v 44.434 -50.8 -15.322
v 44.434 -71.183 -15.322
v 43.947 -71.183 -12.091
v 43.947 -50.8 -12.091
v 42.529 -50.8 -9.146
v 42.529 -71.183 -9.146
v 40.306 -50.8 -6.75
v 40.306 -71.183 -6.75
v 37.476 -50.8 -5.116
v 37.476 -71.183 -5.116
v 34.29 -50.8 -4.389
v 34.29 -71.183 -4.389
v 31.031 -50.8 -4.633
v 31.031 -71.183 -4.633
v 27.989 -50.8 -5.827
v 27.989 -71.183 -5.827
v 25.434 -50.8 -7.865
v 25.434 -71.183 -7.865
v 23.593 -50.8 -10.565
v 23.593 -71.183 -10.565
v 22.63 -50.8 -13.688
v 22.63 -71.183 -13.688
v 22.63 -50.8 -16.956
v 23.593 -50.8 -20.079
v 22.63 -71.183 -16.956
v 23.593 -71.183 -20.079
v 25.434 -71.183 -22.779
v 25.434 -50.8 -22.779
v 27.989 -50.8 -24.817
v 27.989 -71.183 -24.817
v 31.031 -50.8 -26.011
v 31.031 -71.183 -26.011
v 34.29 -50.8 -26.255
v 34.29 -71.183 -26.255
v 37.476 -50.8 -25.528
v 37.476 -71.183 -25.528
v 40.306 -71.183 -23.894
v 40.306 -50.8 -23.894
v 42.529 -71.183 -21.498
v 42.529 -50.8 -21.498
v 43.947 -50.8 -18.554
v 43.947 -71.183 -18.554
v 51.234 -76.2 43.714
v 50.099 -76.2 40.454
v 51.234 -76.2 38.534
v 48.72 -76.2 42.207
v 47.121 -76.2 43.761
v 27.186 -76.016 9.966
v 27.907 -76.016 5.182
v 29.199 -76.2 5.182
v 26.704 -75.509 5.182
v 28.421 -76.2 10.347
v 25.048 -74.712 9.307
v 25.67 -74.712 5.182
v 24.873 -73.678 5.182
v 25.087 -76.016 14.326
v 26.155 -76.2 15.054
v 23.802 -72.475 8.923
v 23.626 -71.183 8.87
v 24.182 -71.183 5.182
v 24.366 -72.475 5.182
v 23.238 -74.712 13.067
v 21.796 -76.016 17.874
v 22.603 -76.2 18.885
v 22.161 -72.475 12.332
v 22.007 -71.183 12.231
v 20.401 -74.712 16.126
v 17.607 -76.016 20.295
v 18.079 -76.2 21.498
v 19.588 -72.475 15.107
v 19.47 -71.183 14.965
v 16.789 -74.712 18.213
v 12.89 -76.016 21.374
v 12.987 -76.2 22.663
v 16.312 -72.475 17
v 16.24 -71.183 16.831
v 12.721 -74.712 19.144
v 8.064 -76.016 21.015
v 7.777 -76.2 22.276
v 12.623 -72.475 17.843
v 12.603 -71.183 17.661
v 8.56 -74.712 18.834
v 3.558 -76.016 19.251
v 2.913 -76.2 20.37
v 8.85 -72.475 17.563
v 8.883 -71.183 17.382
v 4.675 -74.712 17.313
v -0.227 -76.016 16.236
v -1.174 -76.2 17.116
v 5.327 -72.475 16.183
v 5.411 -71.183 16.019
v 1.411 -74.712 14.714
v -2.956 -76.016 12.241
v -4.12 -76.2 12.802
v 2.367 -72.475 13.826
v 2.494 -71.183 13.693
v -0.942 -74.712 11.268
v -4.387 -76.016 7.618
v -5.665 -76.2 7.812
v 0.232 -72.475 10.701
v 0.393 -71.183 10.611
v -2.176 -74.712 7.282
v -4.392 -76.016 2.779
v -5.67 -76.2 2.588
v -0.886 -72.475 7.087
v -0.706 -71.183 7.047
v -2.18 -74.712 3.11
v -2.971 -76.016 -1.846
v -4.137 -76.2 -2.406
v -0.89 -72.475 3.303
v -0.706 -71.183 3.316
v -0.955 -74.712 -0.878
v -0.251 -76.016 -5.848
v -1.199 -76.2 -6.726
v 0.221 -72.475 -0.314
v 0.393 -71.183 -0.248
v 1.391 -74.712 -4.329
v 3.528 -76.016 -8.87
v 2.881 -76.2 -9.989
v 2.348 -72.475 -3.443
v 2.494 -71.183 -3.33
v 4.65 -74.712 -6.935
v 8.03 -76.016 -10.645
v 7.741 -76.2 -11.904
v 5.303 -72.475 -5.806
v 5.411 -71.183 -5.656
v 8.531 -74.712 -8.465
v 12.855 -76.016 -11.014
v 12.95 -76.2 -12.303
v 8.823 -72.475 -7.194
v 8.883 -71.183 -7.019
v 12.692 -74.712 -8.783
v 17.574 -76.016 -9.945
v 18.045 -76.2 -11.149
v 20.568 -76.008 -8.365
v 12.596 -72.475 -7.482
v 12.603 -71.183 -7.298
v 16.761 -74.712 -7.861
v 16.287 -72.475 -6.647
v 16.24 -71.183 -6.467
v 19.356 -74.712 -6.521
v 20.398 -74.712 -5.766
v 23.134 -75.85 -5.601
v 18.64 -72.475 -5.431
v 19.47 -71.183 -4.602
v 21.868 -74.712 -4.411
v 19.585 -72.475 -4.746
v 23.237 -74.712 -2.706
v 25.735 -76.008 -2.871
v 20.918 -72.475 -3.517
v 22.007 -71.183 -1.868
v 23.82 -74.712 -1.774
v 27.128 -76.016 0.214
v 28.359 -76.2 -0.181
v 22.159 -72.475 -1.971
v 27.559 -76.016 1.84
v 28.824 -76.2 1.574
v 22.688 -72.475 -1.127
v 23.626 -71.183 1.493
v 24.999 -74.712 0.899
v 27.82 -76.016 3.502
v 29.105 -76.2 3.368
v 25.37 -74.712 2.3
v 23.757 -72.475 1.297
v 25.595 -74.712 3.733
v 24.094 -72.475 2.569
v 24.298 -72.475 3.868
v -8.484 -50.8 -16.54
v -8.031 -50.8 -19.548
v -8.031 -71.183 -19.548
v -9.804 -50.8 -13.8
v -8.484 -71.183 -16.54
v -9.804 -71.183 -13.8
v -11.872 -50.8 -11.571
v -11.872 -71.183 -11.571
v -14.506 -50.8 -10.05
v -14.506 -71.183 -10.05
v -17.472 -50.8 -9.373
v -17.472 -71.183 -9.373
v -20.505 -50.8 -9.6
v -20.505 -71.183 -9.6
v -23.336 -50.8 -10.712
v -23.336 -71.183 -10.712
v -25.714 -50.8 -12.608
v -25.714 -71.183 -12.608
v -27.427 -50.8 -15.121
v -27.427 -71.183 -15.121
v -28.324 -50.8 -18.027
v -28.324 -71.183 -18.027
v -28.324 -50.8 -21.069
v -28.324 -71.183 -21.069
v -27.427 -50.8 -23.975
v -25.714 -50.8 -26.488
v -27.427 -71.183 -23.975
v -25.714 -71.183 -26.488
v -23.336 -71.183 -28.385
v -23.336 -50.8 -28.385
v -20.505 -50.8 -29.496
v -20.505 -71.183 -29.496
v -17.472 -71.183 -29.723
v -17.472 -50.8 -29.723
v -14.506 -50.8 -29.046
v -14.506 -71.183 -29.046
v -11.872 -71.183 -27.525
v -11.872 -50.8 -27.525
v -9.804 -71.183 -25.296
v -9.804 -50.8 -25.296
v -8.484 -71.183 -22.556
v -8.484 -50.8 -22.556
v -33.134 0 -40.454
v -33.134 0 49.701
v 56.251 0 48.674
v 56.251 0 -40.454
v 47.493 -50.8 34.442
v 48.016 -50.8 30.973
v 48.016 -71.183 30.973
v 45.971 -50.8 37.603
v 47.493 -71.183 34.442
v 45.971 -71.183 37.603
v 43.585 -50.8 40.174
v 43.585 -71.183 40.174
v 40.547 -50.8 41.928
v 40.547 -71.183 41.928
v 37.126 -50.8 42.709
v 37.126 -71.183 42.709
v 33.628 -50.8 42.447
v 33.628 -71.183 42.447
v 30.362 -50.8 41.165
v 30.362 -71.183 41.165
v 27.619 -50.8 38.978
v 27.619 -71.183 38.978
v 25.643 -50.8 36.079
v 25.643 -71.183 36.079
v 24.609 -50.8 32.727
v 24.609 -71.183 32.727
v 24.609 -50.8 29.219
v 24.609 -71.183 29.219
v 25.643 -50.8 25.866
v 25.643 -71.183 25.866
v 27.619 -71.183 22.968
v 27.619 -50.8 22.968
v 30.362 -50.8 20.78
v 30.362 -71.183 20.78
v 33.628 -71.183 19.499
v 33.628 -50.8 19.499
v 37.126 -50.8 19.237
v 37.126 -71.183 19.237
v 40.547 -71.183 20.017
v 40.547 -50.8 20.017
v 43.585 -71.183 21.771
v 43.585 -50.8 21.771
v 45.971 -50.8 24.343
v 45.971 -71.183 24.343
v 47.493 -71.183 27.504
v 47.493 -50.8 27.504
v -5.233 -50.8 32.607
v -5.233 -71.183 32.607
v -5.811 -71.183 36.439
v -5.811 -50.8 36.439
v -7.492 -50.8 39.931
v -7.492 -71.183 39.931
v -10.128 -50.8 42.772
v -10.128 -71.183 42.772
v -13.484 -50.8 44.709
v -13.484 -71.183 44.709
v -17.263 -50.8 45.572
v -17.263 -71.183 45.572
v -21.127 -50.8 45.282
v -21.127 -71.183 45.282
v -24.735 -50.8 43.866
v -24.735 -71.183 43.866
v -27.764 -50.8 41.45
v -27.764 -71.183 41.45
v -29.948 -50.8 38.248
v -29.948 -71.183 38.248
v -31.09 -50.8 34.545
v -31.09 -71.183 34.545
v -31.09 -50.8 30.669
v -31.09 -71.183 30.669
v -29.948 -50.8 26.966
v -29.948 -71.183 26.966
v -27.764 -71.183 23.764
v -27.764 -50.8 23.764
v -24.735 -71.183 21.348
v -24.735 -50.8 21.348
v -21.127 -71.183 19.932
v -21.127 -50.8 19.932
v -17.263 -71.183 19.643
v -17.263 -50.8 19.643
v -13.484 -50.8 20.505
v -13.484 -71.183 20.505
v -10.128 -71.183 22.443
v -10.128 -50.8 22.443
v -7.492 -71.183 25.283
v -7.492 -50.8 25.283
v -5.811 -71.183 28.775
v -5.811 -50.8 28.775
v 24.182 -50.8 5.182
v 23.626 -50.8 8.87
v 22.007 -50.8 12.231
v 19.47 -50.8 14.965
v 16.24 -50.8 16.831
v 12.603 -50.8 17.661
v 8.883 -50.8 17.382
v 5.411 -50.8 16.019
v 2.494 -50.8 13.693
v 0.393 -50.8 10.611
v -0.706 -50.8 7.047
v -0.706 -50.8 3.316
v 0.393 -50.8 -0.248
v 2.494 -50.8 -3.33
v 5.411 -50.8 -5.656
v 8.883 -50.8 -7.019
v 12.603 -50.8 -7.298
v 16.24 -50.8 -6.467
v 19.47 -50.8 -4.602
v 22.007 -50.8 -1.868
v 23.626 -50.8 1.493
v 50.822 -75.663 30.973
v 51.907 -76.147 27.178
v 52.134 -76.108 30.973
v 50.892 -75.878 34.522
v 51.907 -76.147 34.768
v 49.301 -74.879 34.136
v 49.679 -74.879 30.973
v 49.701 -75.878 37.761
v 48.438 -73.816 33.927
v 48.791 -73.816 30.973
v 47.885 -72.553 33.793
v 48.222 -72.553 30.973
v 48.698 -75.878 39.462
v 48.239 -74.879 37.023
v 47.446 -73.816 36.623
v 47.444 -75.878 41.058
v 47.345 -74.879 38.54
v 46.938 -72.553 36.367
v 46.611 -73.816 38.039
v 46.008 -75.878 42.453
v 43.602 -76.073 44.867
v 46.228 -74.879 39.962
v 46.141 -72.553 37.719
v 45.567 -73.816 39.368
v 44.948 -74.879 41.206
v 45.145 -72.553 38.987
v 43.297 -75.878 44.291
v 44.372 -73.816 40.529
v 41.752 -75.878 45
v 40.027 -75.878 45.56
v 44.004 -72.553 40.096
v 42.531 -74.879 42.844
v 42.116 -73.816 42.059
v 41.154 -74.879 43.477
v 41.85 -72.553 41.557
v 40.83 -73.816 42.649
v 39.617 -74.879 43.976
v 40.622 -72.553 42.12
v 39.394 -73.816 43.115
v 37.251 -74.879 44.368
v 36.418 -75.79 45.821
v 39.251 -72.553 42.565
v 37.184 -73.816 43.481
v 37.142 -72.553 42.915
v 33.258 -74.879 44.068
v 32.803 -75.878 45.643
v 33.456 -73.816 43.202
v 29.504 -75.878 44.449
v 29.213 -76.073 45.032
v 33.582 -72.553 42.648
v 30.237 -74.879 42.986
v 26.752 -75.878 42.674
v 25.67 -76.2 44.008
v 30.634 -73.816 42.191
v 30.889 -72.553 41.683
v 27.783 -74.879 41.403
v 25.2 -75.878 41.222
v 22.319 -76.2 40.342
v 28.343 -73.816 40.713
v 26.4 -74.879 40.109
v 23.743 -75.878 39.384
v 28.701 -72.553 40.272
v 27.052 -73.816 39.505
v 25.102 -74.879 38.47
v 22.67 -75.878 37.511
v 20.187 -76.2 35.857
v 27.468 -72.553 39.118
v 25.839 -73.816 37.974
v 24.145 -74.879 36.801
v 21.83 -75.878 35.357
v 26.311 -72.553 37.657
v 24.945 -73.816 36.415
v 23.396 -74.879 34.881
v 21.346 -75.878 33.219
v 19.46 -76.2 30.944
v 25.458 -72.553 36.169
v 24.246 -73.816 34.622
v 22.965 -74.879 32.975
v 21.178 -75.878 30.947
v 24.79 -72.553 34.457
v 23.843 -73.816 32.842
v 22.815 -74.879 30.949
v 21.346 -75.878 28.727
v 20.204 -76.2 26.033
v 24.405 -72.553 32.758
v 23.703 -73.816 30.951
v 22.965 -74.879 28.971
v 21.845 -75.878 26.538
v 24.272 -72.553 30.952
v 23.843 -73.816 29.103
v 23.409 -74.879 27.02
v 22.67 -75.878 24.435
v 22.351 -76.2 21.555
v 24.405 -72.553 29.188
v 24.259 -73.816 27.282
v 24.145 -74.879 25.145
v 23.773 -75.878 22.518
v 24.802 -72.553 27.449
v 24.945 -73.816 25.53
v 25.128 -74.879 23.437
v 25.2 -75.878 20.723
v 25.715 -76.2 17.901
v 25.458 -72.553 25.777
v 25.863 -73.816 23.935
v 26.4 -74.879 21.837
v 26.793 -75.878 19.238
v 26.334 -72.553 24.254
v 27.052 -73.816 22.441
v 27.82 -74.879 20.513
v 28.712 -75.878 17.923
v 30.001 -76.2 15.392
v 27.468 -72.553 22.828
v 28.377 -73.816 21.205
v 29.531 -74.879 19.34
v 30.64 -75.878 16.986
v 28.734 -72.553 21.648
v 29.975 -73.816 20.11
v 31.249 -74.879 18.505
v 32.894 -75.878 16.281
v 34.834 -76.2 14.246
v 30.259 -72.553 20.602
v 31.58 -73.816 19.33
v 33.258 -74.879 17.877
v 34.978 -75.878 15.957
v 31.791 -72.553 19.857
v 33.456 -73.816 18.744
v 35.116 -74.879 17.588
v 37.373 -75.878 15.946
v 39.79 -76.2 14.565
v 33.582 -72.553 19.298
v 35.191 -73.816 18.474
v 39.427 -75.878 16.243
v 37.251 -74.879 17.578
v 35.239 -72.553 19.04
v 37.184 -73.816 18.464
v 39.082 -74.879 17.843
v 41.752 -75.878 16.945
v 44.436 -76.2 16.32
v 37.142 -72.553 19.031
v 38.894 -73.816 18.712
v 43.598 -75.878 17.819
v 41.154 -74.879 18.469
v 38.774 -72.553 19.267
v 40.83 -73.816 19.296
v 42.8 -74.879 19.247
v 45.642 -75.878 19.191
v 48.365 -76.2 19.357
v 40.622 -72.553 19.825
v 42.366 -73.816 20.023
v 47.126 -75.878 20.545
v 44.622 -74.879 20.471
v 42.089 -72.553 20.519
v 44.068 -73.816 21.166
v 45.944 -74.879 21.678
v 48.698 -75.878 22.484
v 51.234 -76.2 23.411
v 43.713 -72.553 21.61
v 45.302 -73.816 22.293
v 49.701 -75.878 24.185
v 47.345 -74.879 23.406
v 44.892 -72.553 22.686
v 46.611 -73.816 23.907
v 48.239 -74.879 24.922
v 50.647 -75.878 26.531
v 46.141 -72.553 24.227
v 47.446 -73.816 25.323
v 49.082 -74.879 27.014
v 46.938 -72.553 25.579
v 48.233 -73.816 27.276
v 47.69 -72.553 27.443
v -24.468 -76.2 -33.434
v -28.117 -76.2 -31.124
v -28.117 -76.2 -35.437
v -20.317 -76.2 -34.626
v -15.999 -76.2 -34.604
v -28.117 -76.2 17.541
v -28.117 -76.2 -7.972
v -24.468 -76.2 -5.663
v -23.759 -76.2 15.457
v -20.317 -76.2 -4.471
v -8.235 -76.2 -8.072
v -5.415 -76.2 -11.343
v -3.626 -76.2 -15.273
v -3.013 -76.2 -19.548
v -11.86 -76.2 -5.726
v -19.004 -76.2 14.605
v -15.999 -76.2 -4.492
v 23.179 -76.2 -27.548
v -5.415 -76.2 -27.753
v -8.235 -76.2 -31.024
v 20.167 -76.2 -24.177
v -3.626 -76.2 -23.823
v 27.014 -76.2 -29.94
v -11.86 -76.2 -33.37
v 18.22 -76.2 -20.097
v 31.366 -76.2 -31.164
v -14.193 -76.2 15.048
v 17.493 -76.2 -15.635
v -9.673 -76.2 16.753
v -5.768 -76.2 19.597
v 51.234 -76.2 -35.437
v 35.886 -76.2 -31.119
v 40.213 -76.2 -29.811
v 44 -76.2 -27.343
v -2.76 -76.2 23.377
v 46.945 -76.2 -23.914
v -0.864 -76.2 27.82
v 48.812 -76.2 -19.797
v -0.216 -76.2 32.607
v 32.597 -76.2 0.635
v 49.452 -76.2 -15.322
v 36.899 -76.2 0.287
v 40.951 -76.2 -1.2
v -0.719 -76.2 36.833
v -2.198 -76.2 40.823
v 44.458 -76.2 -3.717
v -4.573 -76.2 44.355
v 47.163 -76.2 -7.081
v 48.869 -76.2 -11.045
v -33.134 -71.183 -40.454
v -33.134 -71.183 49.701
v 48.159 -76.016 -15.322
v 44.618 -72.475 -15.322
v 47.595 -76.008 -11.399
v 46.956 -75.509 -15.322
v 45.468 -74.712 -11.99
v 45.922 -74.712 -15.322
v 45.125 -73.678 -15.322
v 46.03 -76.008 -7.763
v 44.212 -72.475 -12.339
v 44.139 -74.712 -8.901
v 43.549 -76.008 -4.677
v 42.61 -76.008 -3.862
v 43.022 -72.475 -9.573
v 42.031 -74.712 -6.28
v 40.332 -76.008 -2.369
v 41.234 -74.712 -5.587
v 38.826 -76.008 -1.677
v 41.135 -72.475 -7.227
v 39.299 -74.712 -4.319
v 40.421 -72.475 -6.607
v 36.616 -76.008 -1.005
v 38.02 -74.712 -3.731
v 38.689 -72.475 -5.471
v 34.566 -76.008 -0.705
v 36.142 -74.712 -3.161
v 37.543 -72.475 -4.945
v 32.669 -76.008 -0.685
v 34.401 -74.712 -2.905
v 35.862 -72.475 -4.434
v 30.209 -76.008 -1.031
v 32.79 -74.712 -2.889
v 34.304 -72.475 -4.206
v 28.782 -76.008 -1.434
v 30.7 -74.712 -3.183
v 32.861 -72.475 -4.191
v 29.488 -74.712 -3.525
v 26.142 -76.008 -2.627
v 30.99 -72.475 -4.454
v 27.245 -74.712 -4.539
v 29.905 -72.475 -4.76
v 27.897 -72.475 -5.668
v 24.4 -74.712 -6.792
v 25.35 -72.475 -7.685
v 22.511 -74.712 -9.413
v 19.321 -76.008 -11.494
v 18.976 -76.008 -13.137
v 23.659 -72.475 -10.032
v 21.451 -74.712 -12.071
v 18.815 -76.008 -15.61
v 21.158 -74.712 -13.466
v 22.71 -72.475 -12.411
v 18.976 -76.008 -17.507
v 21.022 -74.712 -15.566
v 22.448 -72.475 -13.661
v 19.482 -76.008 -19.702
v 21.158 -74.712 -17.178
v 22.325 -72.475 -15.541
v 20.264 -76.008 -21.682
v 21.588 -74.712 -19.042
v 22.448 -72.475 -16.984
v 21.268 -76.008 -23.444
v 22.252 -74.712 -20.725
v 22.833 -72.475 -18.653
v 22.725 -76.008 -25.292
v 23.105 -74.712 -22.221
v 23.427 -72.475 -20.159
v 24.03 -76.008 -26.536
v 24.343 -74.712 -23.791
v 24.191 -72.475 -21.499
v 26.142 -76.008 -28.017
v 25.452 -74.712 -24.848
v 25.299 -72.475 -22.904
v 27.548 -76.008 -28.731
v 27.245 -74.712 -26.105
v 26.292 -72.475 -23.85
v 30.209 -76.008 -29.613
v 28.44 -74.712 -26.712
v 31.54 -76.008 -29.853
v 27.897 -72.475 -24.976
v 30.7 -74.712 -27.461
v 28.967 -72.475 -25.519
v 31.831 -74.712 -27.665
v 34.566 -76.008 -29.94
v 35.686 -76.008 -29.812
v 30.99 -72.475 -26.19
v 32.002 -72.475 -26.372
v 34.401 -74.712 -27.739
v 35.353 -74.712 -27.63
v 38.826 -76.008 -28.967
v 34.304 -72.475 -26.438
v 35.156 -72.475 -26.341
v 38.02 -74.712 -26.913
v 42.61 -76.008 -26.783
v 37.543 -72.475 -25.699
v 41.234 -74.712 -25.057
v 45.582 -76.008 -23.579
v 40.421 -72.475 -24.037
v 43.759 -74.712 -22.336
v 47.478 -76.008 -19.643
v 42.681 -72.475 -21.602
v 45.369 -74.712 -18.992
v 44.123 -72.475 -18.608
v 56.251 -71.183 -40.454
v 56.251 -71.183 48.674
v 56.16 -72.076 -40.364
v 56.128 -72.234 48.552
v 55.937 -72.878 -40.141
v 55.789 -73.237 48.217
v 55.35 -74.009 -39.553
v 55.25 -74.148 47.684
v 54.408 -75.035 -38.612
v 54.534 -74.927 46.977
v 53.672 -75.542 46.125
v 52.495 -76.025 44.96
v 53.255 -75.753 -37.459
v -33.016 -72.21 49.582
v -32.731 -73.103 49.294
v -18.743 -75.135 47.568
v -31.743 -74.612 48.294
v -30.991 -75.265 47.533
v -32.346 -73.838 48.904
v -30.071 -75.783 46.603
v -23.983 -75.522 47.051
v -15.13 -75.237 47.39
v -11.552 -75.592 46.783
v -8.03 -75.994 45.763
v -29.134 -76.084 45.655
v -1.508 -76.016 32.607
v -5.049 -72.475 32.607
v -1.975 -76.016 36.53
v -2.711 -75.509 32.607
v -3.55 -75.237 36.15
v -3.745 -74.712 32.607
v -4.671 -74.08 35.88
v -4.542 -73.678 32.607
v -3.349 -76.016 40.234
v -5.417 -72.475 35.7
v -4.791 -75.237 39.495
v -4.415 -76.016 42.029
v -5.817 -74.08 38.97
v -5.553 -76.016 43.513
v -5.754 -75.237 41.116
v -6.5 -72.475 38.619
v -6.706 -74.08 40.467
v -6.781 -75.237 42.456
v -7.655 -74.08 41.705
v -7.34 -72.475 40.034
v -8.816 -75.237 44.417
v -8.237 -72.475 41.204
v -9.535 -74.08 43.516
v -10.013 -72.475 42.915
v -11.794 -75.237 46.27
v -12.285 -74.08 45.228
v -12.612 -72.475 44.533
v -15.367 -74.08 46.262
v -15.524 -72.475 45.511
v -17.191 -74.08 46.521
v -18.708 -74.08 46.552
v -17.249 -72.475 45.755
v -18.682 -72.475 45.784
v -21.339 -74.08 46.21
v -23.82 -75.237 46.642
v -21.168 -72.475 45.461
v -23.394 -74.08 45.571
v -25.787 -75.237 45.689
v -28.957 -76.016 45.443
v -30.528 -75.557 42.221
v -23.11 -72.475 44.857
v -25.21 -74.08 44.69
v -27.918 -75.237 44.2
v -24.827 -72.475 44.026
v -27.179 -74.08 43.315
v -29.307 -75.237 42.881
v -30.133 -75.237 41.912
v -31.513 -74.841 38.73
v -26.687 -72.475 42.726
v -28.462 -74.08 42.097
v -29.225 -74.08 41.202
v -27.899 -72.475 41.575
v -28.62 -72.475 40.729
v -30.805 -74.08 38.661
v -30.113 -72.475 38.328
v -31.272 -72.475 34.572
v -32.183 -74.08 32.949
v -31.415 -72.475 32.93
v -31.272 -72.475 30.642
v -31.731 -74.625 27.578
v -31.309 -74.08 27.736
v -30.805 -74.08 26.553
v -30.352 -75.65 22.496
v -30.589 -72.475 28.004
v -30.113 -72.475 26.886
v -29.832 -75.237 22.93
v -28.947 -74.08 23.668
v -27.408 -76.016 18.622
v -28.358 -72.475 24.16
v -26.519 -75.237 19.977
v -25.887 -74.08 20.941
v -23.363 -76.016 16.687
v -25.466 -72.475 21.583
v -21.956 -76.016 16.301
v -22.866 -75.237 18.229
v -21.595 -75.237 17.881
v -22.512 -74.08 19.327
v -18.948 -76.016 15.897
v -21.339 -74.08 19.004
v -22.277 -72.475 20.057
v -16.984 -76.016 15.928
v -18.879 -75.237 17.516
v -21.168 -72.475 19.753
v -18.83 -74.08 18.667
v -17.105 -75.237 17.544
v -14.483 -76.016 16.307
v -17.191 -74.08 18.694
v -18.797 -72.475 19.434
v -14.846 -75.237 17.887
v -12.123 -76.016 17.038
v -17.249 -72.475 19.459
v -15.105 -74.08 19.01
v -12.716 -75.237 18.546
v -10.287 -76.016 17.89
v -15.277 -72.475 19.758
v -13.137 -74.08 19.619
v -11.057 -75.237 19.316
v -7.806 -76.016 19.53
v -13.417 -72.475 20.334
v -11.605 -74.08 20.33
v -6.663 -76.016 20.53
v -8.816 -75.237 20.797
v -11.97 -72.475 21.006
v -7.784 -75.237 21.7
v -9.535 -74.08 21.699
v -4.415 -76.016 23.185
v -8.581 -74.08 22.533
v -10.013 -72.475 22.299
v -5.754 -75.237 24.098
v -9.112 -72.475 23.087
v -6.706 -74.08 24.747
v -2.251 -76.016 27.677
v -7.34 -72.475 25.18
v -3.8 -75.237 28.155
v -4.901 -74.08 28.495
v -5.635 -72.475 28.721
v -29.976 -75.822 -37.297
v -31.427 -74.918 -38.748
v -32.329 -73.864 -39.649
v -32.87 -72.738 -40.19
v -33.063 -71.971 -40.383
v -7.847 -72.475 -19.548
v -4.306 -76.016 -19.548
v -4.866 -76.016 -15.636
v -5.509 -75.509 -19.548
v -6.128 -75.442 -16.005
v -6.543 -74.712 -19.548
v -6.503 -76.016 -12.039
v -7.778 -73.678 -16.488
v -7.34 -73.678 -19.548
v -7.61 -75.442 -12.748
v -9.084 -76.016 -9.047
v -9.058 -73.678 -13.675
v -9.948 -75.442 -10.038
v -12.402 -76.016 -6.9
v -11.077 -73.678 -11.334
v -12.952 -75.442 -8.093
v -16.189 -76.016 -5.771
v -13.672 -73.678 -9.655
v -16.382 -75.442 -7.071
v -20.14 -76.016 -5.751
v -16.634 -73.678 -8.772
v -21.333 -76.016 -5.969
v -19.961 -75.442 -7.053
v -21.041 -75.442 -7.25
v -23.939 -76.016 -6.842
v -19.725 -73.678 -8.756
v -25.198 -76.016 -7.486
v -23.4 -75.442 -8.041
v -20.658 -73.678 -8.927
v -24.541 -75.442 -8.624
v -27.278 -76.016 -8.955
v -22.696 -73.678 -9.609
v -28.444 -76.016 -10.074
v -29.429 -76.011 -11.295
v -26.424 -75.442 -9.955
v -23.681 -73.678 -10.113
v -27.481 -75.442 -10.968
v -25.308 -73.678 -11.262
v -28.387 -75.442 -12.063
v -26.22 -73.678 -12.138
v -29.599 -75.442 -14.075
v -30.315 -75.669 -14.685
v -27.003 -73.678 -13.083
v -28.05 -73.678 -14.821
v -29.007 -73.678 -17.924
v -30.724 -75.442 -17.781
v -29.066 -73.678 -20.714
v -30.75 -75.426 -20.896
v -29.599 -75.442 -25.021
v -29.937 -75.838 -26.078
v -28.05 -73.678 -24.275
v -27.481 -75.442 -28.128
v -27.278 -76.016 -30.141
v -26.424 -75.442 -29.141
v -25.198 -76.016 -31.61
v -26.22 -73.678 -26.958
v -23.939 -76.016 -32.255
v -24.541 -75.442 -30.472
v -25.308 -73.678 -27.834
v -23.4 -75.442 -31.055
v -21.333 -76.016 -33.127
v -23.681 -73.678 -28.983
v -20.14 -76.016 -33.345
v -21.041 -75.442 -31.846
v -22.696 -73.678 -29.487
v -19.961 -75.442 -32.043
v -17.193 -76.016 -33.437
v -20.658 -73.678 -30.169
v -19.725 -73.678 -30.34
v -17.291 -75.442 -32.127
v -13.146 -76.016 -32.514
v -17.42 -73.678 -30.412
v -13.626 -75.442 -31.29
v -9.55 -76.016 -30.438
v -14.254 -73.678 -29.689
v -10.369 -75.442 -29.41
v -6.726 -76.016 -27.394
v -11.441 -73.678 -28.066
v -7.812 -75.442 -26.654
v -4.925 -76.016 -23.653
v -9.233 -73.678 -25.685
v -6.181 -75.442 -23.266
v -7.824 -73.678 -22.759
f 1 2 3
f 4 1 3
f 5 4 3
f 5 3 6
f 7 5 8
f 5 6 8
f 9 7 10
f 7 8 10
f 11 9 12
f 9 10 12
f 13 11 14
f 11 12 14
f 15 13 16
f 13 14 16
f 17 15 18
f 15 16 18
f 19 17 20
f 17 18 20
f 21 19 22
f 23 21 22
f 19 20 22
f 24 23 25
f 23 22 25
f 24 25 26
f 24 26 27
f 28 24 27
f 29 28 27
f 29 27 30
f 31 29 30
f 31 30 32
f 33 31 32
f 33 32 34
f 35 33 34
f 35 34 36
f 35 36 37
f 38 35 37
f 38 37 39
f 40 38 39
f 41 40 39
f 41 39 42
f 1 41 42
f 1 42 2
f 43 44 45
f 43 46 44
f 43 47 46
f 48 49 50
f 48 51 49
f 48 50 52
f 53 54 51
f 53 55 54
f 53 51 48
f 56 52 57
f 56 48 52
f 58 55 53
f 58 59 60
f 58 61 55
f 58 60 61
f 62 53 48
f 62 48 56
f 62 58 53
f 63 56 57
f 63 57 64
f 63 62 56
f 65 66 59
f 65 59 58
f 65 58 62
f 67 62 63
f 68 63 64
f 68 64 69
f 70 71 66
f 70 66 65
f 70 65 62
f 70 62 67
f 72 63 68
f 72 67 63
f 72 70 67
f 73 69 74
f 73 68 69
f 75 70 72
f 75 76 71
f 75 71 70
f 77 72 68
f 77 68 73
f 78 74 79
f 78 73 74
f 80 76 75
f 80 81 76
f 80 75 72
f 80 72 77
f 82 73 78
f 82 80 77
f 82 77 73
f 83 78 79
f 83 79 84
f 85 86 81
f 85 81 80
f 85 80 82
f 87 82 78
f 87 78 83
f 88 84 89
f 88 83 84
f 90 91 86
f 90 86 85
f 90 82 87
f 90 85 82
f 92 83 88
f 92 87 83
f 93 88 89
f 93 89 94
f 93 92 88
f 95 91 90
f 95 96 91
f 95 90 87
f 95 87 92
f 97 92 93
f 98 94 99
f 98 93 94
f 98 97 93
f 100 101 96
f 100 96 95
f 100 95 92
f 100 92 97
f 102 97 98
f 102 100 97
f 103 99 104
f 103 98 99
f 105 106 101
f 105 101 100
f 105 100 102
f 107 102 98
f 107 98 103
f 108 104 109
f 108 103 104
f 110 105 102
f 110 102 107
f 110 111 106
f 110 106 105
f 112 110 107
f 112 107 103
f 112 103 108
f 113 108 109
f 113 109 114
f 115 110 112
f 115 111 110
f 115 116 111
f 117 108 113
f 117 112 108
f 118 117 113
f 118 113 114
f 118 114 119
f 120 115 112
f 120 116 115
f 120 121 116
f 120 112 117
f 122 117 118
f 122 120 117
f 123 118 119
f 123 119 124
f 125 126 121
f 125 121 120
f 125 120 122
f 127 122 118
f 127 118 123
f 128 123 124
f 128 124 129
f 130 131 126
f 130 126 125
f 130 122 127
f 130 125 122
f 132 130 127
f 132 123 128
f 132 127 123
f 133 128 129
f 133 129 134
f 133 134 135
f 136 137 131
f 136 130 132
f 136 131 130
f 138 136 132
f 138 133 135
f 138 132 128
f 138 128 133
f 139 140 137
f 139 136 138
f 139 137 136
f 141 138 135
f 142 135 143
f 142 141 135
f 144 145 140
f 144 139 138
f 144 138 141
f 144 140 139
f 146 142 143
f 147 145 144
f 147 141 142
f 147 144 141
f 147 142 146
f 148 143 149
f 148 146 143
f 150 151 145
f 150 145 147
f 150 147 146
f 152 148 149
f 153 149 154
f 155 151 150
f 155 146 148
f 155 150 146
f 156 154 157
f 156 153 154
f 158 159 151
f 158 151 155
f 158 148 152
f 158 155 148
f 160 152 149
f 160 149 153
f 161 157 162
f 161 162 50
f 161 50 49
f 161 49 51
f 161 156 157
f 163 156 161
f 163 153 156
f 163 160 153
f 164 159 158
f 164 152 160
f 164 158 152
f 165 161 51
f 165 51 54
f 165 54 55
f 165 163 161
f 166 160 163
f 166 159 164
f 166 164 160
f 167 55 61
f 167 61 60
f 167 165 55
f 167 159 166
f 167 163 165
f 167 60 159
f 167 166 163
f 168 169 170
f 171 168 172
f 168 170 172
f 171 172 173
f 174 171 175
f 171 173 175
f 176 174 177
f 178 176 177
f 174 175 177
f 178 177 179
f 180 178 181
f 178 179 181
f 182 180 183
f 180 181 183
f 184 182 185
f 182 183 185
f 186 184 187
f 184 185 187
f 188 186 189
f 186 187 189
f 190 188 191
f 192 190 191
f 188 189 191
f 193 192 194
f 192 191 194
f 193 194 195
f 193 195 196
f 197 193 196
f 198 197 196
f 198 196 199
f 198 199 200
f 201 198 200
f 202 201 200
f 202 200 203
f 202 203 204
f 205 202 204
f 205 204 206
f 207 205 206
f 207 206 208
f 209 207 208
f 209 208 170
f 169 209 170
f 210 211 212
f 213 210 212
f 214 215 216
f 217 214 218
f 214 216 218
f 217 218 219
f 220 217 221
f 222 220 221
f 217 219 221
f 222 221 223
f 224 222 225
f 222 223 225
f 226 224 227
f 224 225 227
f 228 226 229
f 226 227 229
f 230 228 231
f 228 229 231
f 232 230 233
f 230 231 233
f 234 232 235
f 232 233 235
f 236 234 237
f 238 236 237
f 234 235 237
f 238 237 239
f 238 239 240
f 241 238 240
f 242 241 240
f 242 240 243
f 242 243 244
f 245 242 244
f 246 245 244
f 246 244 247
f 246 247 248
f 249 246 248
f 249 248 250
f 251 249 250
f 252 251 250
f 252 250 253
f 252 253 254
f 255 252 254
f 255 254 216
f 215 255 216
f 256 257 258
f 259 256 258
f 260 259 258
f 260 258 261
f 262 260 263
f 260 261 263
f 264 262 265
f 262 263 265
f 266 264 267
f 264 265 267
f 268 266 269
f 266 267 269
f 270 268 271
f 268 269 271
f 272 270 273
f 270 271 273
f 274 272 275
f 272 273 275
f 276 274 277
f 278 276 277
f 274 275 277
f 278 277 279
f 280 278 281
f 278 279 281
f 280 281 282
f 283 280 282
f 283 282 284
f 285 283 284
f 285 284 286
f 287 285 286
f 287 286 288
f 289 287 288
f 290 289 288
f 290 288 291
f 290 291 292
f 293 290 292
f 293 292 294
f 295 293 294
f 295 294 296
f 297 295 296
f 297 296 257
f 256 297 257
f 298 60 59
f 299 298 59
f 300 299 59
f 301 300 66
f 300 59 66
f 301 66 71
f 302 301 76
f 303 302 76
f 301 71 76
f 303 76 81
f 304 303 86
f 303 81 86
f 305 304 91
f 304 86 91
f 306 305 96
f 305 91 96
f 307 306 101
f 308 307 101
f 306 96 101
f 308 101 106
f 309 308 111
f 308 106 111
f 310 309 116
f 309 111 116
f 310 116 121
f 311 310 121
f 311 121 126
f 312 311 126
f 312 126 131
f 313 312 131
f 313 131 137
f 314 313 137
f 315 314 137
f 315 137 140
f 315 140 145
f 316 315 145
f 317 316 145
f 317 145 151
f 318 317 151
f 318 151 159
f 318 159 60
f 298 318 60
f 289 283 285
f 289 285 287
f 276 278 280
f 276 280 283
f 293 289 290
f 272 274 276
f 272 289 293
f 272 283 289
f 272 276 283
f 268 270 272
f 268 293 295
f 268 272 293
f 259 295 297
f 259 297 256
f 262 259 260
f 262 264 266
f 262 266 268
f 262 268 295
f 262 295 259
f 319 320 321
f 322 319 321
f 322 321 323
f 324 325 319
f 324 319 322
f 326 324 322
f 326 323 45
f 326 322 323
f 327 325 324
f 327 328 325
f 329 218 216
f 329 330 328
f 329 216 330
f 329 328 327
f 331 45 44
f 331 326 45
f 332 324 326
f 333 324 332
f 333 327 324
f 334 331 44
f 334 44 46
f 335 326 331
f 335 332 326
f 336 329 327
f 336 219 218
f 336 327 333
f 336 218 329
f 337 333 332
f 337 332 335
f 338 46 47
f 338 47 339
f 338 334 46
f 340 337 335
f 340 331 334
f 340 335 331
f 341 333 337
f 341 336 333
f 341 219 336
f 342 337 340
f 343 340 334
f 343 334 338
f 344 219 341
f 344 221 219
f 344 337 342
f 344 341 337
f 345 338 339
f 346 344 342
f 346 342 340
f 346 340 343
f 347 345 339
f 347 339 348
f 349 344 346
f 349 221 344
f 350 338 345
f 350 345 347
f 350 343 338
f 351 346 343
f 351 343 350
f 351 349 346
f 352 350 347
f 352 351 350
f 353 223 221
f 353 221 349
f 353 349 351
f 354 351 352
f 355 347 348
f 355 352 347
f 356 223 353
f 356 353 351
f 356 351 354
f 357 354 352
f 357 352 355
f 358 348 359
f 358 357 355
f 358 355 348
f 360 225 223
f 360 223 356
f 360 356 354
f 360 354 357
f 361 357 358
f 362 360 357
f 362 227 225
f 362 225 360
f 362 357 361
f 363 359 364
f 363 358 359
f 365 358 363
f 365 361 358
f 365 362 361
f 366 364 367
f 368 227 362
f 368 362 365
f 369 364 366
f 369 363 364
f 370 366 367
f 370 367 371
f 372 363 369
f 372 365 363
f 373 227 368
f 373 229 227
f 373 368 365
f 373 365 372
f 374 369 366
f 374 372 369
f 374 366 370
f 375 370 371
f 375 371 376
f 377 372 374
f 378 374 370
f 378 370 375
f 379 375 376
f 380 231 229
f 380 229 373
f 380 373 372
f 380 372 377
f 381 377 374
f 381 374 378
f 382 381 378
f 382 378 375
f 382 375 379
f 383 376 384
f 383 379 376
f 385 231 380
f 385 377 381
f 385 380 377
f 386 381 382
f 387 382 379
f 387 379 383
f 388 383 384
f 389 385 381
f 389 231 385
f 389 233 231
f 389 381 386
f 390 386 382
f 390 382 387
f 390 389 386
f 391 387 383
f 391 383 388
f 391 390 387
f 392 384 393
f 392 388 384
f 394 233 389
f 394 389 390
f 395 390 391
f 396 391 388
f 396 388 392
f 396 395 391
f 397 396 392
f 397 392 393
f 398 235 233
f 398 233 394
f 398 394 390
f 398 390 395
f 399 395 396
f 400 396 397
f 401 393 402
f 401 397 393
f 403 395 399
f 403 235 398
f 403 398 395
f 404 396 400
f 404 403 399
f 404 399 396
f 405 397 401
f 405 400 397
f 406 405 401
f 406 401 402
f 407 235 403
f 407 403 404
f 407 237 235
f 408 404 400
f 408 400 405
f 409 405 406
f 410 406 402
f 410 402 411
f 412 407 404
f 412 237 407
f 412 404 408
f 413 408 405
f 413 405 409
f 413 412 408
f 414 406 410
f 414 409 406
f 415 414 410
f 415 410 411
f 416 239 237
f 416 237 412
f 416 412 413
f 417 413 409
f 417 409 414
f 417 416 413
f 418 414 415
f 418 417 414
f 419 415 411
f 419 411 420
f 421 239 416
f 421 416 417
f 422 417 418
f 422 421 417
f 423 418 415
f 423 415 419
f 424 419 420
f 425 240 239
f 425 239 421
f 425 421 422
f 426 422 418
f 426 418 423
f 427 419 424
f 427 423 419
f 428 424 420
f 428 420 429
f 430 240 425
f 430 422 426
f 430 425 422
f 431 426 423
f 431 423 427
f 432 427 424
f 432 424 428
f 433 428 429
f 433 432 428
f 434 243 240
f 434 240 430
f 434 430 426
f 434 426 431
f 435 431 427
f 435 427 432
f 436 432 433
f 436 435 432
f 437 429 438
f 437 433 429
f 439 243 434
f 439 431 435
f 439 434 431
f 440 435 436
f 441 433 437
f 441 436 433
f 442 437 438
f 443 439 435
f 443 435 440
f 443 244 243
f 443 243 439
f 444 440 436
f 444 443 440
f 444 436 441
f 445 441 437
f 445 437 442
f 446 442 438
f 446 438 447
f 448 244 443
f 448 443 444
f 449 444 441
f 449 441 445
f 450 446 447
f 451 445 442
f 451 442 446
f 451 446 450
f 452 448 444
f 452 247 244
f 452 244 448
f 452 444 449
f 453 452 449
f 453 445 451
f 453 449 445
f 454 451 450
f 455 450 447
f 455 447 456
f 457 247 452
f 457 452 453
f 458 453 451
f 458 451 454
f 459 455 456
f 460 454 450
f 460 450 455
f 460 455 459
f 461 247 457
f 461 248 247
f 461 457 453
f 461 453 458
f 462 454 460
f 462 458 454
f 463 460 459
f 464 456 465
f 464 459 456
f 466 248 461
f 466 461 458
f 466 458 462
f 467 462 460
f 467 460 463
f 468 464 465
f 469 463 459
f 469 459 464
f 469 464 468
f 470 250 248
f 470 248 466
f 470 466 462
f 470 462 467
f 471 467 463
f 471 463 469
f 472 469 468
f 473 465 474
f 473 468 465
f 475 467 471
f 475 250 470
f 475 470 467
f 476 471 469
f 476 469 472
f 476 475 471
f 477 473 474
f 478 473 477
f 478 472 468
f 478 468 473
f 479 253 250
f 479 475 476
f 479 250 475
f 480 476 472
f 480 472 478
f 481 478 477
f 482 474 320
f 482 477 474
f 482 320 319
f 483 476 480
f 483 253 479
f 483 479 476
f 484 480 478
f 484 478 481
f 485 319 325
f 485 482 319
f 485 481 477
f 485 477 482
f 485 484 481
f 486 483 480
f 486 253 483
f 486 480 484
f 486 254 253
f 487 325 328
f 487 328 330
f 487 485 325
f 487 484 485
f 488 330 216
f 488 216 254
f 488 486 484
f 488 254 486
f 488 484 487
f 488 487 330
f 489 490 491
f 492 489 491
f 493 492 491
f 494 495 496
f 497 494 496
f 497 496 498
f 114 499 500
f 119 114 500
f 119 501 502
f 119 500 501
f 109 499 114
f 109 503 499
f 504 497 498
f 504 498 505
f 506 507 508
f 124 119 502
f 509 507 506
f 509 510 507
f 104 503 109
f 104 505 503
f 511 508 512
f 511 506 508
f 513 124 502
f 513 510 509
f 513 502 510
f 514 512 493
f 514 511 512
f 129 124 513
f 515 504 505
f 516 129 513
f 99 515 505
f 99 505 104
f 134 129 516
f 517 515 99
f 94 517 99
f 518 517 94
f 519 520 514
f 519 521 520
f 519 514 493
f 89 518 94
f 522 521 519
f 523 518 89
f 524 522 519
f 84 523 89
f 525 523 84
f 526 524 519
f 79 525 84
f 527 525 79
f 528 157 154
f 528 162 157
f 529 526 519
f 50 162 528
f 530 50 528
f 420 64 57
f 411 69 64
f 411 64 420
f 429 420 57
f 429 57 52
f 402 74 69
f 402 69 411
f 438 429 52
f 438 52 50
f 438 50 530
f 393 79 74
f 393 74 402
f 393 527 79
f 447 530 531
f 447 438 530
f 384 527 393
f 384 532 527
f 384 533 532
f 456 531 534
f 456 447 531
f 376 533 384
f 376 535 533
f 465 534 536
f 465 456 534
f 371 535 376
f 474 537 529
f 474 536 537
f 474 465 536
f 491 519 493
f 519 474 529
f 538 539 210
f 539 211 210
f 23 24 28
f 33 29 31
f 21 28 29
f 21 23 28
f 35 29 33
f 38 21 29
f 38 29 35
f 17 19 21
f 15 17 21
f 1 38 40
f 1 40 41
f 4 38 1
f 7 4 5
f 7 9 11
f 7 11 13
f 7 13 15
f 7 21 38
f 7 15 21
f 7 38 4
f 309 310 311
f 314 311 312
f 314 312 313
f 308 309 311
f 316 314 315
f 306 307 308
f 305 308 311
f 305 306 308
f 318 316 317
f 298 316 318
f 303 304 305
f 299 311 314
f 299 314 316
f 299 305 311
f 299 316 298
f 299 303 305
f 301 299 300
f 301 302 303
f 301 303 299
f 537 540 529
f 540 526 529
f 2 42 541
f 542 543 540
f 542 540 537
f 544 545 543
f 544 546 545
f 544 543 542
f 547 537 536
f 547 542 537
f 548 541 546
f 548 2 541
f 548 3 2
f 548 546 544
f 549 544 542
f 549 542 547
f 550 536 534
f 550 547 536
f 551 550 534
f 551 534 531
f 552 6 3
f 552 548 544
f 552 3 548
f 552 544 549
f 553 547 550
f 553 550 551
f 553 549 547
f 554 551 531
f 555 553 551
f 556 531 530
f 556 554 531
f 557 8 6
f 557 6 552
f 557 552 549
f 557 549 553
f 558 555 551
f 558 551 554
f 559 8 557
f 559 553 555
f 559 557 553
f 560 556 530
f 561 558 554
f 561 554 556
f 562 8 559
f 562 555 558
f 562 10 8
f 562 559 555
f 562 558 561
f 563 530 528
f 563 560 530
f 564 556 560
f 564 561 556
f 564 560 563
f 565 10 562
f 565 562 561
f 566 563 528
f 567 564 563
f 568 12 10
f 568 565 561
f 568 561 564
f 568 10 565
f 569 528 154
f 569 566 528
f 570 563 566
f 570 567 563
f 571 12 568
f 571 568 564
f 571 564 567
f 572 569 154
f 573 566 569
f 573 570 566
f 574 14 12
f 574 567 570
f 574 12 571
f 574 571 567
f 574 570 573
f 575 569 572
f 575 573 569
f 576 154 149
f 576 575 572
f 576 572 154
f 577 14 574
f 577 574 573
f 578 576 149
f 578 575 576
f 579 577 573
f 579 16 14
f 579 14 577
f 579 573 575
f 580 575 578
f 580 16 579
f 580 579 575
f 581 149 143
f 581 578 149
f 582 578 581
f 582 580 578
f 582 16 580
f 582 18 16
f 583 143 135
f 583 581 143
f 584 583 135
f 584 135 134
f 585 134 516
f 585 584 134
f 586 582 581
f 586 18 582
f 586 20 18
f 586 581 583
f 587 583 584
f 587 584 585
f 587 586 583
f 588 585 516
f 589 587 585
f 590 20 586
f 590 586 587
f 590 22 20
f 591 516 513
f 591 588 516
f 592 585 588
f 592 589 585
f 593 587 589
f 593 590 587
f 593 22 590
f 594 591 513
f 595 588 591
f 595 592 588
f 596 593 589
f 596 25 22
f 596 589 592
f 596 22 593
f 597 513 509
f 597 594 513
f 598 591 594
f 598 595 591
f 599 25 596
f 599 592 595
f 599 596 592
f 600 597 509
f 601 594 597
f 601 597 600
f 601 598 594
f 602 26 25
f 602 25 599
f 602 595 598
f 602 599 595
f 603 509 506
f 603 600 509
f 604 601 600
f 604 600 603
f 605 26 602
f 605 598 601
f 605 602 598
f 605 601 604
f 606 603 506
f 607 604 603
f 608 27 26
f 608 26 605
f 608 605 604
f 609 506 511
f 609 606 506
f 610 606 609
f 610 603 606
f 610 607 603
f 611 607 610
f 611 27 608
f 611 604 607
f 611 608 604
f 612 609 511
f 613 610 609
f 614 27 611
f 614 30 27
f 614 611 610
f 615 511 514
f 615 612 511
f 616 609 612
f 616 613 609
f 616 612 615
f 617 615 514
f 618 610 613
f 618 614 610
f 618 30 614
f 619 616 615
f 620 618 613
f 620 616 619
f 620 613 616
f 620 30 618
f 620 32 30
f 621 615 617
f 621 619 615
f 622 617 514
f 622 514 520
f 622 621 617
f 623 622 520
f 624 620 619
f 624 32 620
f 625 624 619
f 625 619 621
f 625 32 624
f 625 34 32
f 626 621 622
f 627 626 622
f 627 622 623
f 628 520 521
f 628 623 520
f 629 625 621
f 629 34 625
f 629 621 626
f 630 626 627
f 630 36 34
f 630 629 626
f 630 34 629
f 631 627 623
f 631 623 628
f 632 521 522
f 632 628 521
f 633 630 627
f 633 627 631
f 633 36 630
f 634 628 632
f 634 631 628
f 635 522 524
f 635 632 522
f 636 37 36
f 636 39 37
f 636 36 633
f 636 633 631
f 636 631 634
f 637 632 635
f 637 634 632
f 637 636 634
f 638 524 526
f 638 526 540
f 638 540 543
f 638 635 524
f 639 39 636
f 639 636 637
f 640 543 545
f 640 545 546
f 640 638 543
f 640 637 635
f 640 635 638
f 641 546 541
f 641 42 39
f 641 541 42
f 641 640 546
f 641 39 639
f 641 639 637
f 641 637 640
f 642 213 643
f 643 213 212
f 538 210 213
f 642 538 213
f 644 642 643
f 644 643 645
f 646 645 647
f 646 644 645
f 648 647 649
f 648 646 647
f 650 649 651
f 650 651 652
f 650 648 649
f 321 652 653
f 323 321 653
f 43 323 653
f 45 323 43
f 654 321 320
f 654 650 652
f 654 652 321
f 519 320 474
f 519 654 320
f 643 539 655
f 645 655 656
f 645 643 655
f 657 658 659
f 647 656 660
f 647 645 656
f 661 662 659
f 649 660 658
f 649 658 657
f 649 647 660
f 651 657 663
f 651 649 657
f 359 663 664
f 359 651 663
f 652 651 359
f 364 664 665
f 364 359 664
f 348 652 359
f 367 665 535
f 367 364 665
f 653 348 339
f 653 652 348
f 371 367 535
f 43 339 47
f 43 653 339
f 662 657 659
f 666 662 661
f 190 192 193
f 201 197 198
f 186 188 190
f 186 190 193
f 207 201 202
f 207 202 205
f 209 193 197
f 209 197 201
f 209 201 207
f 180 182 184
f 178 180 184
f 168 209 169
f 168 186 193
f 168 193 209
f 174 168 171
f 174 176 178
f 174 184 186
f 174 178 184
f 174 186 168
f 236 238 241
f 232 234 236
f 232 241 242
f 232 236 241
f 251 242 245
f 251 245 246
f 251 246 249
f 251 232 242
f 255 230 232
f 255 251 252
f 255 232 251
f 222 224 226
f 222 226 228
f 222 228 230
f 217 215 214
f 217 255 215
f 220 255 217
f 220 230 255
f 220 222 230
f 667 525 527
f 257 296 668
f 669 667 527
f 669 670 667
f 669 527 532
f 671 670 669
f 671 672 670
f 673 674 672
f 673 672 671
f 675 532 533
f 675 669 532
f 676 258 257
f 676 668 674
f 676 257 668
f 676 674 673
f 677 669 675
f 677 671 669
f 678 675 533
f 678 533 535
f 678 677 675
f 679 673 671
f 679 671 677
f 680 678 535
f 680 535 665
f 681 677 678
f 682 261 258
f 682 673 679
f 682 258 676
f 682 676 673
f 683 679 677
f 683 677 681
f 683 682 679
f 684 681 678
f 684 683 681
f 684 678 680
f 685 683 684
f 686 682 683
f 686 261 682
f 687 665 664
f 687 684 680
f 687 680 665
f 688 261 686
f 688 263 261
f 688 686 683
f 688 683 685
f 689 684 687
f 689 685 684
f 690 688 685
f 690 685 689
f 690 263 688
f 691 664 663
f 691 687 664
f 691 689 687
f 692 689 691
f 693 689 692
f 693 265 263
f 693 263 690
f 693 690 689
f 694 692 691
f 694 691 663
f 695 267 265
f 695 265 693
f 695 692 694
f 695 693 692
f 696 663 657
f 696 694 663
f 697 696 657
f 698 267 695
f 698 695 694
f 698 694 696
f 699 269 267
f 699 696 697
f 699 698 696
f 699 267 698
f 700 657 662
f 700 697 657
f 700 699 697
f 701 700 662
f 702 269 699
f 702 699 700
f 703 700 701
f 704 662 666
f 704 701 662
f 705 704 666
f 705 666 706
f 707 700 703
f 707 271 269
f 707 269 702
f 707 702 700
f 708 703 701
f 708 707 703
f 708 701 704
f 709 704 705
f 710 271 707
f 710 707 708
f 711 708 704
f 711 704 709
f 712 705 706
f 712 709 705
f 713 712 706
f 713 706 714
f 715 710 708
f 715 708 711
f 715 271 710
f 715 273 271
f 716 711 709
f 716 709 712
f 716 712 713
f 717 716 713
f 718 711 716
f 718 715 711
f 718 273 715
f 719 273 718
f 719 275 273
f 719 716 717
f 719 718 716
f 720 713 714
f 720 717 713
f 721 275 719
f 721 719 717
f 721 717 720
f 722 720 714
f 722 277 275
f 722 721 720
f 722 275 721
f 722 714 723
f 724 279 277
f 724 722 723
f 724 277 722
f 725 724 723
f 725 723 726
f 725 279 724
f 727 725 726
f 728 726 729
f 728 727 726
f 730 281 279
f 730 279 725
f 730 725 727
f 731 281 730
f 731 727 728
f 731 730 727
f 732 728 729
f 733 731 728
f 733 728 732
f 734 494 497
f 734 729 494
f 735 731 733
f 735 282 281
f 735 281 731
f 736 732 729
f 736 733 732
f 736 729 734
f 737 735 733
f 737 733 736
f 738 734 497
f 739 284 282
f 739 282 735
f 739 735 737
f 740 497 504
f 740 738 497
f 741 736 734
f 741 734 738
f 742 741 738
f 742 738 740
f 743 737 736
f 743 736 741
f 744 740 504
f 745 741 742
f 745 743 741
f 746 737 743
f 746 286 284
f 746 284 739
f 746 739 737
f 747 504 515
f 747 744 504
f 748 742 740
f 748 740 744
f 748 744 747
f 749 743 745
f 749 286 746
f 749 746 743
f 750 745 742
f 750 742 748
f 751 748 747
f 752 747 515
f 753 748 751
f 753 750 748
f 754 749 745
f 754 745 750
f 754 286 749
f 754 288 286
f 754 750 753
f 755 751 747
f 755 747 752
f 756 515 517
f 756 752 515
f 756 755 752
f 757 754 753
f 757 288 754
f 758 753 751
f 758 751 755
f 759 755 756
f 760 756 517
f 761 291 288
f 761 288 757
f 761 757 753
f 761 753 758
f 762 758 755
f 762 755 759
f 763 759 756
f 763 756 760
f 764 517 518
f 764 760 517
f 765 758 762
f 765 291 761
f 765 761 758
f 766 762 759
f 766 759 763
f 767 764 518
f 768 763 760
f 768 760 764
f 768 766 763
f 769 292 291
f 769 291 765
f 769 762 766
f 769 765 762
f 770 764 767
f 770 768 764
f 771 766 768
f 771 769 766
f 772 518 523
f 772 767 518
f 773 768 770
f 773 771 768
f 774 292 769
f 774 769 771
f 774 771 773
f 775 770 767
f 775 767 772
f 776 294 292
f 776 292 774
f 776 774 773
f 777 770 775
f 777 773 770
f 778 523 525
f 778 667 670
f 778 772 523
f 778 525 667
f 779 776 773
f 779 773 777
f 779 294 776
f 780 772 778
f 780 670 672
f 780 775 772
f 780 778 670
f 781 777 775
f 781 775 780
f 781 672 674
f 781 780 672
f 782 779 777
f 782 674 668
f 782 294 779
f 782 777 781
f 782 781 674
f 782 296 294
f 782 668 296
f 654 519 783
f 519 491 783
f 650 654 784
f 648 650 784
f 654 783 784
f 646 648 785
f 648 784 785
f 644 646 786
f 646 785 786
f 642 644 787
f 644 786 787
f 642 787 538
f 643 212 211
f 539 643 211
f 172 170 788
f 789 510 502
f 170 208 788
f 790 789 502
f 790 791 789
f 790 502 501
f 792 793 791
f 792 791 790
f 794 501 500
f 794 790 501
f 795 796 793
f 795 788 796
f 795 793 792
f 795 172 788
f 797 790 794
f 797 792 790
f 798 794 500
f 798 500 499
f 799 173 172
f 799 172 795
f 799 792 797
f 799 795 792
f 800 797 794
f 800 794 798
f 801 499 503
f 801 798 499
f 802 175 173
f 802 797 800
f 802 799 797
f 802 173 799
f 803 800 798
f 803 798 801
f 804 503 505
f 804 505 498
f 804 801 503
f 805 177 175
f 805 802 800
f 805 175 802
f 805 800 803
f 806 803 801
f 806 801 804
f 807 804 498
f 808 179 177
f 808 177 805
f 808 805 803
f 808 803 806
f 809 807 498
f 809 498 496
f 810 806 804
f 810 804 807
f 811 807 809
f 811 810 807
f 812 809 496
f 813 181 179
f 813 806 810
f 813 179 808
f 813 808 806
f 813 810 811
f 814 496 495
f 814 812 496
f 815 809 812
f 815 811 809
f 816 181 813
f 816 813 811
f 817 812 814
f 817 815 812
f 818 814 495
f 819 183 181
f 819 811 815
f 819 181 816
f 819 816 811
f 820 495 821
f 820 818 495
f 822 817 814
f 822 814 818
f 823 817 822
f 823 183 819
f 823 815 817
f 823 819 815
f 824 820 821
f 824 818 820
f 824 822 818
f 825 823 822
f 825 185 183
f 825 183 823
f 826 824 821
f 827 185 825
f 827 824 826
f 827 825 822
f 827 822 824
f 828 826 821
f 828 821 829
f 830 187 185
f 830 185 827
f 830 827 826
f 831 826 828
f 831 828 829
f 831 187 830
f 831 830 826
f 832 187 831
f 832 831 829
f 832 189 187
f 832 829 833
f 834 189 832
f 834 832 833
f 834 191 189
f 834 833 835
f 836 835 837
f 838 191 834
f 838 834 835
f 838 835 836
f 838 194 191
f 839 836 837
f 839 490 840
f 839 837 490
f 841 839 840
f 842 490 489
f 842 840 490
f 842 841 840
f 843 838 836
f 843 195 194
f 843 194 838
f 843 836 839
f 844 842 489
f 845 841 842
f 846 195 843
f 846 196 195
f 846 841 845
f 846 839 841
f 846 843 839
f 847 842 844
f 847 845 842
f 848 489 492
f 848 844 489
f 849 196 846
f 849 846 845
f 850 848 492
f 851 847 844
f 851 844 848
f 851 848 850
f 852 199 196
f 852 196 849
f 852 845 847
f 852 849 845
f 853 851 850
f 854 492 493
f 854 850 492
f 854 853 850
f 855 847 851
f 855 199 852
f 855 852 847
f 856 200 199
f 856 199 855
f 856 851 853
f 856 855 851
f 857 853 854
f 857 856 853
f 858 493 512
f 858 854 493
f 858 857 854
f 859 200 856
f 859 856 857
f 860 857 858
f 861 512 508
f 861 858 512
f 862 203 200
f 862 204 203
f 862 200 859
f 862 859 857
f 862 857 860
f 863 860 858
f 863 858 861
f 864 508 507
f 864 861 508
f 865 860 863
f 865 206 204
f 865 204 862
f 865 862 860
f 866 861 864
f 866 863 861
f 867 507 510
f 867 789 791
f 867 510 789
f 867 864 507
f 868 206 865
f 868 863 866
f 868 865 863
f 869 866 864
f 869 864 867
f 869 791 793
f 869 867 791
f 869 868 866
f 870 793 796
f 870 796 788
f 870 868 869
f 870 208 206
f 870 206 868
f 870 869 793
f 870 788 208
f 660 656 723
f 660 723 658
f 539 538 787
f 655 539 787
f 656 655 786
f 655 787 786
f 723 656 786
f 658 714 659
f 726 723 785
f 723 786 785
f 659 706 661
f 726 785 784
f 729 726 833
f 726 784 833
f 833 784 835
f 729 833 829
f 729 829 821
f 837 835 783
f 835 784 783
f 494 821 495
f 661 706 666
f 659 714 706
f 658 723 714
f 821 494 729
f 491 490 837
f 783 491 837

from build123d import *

# Parameters (mm, degrees)
F1_DEPTH    = 76.2
F2_R        = 13.0009566934
F2_R_2      = 11.7691858669
F2_R_3      = 12.5140273394
F2_R_4      = 10.2035026267
F2_R_5      = 10.9635179416
F4_DEPTH    = 25.4
F5_T1_DEPTH = 114.7959034965
F5_T3_DEPTH = 114.5331439546
F5_T5_DEPTH = 115.5605603925
F5_T7_DEPTH = 114.7899989954


# Not quite as in the source:
# - a fillet or chamfer that OpenCascade refuses, or shapes differently, is made with other operations: its cross-section is extruded or revolved along the edge and cut away or added


with BuildPart() as f1:
    # F0 (on Front) → F1 (new body)
    with BuildSketch(Plane.XZ):
        Polygon((56.2510117888, 48.6738197505), (-33.1341587007, 49.7012361884), (-33.1341587007, -40.4544956982), (56.2510117888, -40.4544956982), align=None)
    extrude(amount=F1_DEPTH)

    # F2 (on face) → F4 (cut)
    with BuildSketch(Plane.XZ.offset(76.2)):
        with Locations((-18.2341039181, 32.6071083546)):
            Circle(F2_R)
        with Locations((36.246843636, 30.9728365391)):
            Circle(F2_R_2)
        with Locations((11.6678411141, 5.1815295592)):
            Circle(F2_R_3)
        with Locations((-18.2341039181, -19.5480342954)):
            Circle(F2_R_4)
        with Locations((33.4707759321, -15.3220649809)):
            Circle(F2_R_5)
    extrude(amount=-F4_DEPTH, mode=Mode.SUBTRACT)

    # F5: fillet of radius 5.08 on 9 edges, made by hand

    # F5_s2 → F5_t1 (cut)
    with BuildSketch(Plane(origin=(68.3857605657, 0, -0.7860437491), x_dir=(0, 1, 0), z_dir=(-0.9999339475, 0, 0.0114935013))):
        with BuildLine():
            ThreePointArc((-71.1190343146, -49.3175258025), (-74.7121024484, -47.829228251), (-76.2004, -44.2361601171))
            Line((-76.2004, -44.2361601171), (-76.7085365685, -44.2361601171))
            ThreePointArc((-76.7085365685, -44.2361601171), (-76.7081365685, -46.7766429598), (-76.7081365685, -49.3171258025))
            Line((-76.7081365685, -49.3171258025), (-76.2, -49.8252623711))
            ThreePointArc((-76.2, -49.8252623711), (-73.6595171573, -49.8252623711), (-71.1190343146, -49.8256623711))
            Line((-71.1190343146, -49.8256623711), (-71.1190343146, -49.3175258025))
        make_face()
    extrude(amount=F5_T1_DEPTH, mode=Mode.SUBTRACT)

    # F5_s4 → F5_t3 (cut)
    with BuildSketch(Plane.XY.offset(-53.1569099511)):
        with BuildLine():
            ThreePointArc((56.2514117888, -71.1190343146), (54.7631142373, -74.7121024484), (51.1700461034, -76.2004))
            Line((51.1700461034, -76.2004), (51.1700461034, -76.7085365685))
            ThreePointArc((51.1700461034, -76.7085365685), (53.7105289461, -76.7081365685), (56.2510117888, -76.7081365685))
            Line((56.2510117888, -76.7081365685), (56.7591483574, -76.2))
            ThreePointArc((56.7591483574, -76.2), (56.7591483574, -73.6595171573), (56.7595483574, -71.1190343146))
            Line((56.7595483574, -71.1190343146), (56.2514117888, -71.1190343146))
        make_face()
    extrude(amount=F5_T3_DEPTH, mode=Mode.SUBTRACT)

    # F5_s6 → F5_t5 (cut)
    with BuildSketch(Plane.XY.offset(-53.1569099511)):
        with BuildLine():
            ThreePointArc((-33.1345587007, -71.1190343146), (-31.6462611491, -74.7121024484), (-28.0531930153, -76.2004))
            Line((-28.0531930153, -76.2004), (-28.0531930153, -76.7085365685))
            ThreePointArc((-28.0531930153, -76.7085365685), (-30.593675858, -76.7081365685), (-33.1341587007, -76.7081365685))
            Line((-33.1341587007, -76.7081365685), (-33.6422952692, -76.2))
            ThreePointArc((-33.6422952692, -76.2), (-33.6422952692, -73.6595171573), (-33.6426952692, -71.1190343146))
            Line((-33.6426952692, -71.1190343146), (-33.1345587007, -71.1190343146))
        make_face()
    extrude(amount=F5_T5_DEPTH, mode=Mode.SUBTRACT)

    # F5_s8 → F5_t7 (cut)
    with BuildSketch(Plane.YZ.offset(-45.8365729536)):
        with BuildLine():
            ThreePointArc((-76.2004, -35.3735300128), (-74.7121024484, -38.9665981466), (-71.1190343146, -40.4548956982))
            Line((-71.1190343146, -40.4548956982), (-71.1190343146, -40.9630322668))
            ThreePointArc((-71.1190343146, -40.9630322668), (-73.6595171573, -40.9626322668), (-76.2, -40.9626322668))
            Line((-76.2, -40.9626322668), (-76.7081365685, -40.4544956982))
            ThreePointArc((-76.7081365685, -40.4544956982), (-76.7081365685, -37.9140128555), (-76.7085365685, -35.3735300128))
            Line((-76.7085365685, -35.3735300128), (-76.2004, -35.3735300128))
        make_face()
    extrude(amount=F5_T7_DEPTH, mode=Mode.SUBTRACT)

    # F5_s9 → F5_t10 (revolve, cut)
    with BuildSketch(Plane.XY.offset(-19.5480342954)):
        with BuildLine():
            ThreePointArc((-2.949635606, -76.2004), (-6.5427037398, -74.7121024484), (-8.0310012914, -71.1190343146))
            Line((-8.0310012914, -71.1190343146), (-8.53913786, -71.1190343146))
            ThreePointArc((-8.53913786, -71.1190343146), (-8.53873786, -73.6595171573), (-8.53873786, -76.2))
            Line((-8.53873786, -76.2), (-8.0306012914, -76.7081365685))
            ThreePointArc((-8.0306012914, -76.7081365685), (-5.4901184487, -76.7081365685), (-2.949635606, -76.7085365685))
            Line((-2.949635606, -76.7085365685), (-2.949635606, -76.2004))
        make_face()
    revolve(axis=Axis((-18.2341039181, -76.2, -19.5480342954), (0, -1, 0)), mode=Mode.SUBTRACT)

    # F5_s11 → F5_t12 (revolve, cut)
    with BuildSketch(Plane.XY.offset(-15.3220649809)):
        with BuildLine():
            ThreePointArc((49.5152595591, -76.2004), (45.9221914252, -74.7121024484), (44.4338938736, -71.1190343146))
            Line((44.4338938736, -71.1190343146), (43.9257573051, -71.1190343146))
            ThreePointArc((43.9257573051, -71.1190343146), (43.9261573051, -73.6595171573), (43.9261573051, -76.2))
            Line((43.9261573051, -76.2), (44.4342938736, -76.7081365685))
            ThreePointArc((44.4342938736, -76.7081365685), (46.9747767164, -76.7081365685), (49.5152595591, -76.7085365685))
            Line((49.5152595591, -76.7085365685), (49.5152595591, -76.2004))
        make_face()
    revolve(axis=Axis((33.4707759321, -76.2, -15.3220649809), (0, -1, 0)), mode=Mode.SUBTRACT)

    # F5_s13 → F5_t14 (revolve, cut)
    with BuildSketch(Plane.XY.offset(5.1815295592)):
        with BuildLine():
            ThreePointArc((29.2628341389, -76.2004), (25.6697660051, -74.7121024484), (24.1814684535, -71.1190343146))
            Line((24.1814684535, -71.1190343146), (23.673331885, -71.1190343146))
            ThreePointArc((23.673331885, -71.1190343146), (23.673731885, -73.6595171573), (23.673731885, -76.2))
            Line((23.673731885, -76.2), (24.1818684535, -76.7081365685))
            ThreePointArc((24.1818684535, -76.7081365685), (26.7223512962, -76.7081365685), (29.2628341389, -76.7085365685))
            Line((29.2628341389, -76.7085365685), (29.2628341389, -76.2004))
        make_face()
    revolve(axis=Axis((11.6678411141, -76.2, 5.1815295592), (0, -1, 0)), mode=Mode.SUBTRACT)

    # F5_s15 → F5_t16 (revolve, cut)
    with BuildSketch(Plane.XY.offset(32.6071083546)):
        with BuildLine():
            ThreePointArc((-0.1521815393, -76.2004), (-3.7452496731, -74.7121024484), (-5.2335472247, -71.1190343146))
            Line((-5.2335472247, -71.1190343146), (-5.7416837932, -71.1190343146))
            ThreePointArc((-5.7416837932, -71.1190343146), (-5.7412837932, -73.6595171573), (-5.7412837932, -76.2))
            Line((-5.7412837932, -76.2), (-5.2331472247, -76.7081365685))
            ThreePointArc((-5.2331472247, -76.7081365685), (-2.692664382, -76.7081365685), (-0.1521815393, -76.7085365685))
            Line((-0.1521815393, -76.7085365685), (-0.1521815393, -76.2004))
        make_face()
    revolve(axis=Axis((-18.2341039181, -76.2, 32.6071083546), (0, -1, 0)), mode=Mode.SUBTRACT)

    # F5_s17 → F5_t18 (revolve, cut)
    with BuildSketch(Plane.XY.offset(30.9728365391)):
        with BuildLine():
            ThreePointArc((53.0969951883, -76.2004), (49.5039270545, -74.7121024484), (48.0156295029, -71.1190343146))
            Line((48.0156295029, -71.1190343146), (47.5074929344, -71.1190343146))
            ThreePointArc((47.5074929344, -71.1190343146), (47.5078929344, -73.6595171573), (47.5078929344, -76.2))
            Line((47.5078929344, -76.2), (48.0160295029, -76.7081365685))
            ThreePointArc((48.0160295029, -76.7081365685), (50.5565123456, -76.7081365685), (53.0969951883, -76.7085365685))
            Line((53.0969951883, -76.7085365685), (53.0969951883, -76.2004))
        make_face()
    revolve(axis=Axis((36.246843636, -76.2, 30.9728365391), (0, -1, 0)), mode=Mode.SUBTRACT)


solid = f1.part
